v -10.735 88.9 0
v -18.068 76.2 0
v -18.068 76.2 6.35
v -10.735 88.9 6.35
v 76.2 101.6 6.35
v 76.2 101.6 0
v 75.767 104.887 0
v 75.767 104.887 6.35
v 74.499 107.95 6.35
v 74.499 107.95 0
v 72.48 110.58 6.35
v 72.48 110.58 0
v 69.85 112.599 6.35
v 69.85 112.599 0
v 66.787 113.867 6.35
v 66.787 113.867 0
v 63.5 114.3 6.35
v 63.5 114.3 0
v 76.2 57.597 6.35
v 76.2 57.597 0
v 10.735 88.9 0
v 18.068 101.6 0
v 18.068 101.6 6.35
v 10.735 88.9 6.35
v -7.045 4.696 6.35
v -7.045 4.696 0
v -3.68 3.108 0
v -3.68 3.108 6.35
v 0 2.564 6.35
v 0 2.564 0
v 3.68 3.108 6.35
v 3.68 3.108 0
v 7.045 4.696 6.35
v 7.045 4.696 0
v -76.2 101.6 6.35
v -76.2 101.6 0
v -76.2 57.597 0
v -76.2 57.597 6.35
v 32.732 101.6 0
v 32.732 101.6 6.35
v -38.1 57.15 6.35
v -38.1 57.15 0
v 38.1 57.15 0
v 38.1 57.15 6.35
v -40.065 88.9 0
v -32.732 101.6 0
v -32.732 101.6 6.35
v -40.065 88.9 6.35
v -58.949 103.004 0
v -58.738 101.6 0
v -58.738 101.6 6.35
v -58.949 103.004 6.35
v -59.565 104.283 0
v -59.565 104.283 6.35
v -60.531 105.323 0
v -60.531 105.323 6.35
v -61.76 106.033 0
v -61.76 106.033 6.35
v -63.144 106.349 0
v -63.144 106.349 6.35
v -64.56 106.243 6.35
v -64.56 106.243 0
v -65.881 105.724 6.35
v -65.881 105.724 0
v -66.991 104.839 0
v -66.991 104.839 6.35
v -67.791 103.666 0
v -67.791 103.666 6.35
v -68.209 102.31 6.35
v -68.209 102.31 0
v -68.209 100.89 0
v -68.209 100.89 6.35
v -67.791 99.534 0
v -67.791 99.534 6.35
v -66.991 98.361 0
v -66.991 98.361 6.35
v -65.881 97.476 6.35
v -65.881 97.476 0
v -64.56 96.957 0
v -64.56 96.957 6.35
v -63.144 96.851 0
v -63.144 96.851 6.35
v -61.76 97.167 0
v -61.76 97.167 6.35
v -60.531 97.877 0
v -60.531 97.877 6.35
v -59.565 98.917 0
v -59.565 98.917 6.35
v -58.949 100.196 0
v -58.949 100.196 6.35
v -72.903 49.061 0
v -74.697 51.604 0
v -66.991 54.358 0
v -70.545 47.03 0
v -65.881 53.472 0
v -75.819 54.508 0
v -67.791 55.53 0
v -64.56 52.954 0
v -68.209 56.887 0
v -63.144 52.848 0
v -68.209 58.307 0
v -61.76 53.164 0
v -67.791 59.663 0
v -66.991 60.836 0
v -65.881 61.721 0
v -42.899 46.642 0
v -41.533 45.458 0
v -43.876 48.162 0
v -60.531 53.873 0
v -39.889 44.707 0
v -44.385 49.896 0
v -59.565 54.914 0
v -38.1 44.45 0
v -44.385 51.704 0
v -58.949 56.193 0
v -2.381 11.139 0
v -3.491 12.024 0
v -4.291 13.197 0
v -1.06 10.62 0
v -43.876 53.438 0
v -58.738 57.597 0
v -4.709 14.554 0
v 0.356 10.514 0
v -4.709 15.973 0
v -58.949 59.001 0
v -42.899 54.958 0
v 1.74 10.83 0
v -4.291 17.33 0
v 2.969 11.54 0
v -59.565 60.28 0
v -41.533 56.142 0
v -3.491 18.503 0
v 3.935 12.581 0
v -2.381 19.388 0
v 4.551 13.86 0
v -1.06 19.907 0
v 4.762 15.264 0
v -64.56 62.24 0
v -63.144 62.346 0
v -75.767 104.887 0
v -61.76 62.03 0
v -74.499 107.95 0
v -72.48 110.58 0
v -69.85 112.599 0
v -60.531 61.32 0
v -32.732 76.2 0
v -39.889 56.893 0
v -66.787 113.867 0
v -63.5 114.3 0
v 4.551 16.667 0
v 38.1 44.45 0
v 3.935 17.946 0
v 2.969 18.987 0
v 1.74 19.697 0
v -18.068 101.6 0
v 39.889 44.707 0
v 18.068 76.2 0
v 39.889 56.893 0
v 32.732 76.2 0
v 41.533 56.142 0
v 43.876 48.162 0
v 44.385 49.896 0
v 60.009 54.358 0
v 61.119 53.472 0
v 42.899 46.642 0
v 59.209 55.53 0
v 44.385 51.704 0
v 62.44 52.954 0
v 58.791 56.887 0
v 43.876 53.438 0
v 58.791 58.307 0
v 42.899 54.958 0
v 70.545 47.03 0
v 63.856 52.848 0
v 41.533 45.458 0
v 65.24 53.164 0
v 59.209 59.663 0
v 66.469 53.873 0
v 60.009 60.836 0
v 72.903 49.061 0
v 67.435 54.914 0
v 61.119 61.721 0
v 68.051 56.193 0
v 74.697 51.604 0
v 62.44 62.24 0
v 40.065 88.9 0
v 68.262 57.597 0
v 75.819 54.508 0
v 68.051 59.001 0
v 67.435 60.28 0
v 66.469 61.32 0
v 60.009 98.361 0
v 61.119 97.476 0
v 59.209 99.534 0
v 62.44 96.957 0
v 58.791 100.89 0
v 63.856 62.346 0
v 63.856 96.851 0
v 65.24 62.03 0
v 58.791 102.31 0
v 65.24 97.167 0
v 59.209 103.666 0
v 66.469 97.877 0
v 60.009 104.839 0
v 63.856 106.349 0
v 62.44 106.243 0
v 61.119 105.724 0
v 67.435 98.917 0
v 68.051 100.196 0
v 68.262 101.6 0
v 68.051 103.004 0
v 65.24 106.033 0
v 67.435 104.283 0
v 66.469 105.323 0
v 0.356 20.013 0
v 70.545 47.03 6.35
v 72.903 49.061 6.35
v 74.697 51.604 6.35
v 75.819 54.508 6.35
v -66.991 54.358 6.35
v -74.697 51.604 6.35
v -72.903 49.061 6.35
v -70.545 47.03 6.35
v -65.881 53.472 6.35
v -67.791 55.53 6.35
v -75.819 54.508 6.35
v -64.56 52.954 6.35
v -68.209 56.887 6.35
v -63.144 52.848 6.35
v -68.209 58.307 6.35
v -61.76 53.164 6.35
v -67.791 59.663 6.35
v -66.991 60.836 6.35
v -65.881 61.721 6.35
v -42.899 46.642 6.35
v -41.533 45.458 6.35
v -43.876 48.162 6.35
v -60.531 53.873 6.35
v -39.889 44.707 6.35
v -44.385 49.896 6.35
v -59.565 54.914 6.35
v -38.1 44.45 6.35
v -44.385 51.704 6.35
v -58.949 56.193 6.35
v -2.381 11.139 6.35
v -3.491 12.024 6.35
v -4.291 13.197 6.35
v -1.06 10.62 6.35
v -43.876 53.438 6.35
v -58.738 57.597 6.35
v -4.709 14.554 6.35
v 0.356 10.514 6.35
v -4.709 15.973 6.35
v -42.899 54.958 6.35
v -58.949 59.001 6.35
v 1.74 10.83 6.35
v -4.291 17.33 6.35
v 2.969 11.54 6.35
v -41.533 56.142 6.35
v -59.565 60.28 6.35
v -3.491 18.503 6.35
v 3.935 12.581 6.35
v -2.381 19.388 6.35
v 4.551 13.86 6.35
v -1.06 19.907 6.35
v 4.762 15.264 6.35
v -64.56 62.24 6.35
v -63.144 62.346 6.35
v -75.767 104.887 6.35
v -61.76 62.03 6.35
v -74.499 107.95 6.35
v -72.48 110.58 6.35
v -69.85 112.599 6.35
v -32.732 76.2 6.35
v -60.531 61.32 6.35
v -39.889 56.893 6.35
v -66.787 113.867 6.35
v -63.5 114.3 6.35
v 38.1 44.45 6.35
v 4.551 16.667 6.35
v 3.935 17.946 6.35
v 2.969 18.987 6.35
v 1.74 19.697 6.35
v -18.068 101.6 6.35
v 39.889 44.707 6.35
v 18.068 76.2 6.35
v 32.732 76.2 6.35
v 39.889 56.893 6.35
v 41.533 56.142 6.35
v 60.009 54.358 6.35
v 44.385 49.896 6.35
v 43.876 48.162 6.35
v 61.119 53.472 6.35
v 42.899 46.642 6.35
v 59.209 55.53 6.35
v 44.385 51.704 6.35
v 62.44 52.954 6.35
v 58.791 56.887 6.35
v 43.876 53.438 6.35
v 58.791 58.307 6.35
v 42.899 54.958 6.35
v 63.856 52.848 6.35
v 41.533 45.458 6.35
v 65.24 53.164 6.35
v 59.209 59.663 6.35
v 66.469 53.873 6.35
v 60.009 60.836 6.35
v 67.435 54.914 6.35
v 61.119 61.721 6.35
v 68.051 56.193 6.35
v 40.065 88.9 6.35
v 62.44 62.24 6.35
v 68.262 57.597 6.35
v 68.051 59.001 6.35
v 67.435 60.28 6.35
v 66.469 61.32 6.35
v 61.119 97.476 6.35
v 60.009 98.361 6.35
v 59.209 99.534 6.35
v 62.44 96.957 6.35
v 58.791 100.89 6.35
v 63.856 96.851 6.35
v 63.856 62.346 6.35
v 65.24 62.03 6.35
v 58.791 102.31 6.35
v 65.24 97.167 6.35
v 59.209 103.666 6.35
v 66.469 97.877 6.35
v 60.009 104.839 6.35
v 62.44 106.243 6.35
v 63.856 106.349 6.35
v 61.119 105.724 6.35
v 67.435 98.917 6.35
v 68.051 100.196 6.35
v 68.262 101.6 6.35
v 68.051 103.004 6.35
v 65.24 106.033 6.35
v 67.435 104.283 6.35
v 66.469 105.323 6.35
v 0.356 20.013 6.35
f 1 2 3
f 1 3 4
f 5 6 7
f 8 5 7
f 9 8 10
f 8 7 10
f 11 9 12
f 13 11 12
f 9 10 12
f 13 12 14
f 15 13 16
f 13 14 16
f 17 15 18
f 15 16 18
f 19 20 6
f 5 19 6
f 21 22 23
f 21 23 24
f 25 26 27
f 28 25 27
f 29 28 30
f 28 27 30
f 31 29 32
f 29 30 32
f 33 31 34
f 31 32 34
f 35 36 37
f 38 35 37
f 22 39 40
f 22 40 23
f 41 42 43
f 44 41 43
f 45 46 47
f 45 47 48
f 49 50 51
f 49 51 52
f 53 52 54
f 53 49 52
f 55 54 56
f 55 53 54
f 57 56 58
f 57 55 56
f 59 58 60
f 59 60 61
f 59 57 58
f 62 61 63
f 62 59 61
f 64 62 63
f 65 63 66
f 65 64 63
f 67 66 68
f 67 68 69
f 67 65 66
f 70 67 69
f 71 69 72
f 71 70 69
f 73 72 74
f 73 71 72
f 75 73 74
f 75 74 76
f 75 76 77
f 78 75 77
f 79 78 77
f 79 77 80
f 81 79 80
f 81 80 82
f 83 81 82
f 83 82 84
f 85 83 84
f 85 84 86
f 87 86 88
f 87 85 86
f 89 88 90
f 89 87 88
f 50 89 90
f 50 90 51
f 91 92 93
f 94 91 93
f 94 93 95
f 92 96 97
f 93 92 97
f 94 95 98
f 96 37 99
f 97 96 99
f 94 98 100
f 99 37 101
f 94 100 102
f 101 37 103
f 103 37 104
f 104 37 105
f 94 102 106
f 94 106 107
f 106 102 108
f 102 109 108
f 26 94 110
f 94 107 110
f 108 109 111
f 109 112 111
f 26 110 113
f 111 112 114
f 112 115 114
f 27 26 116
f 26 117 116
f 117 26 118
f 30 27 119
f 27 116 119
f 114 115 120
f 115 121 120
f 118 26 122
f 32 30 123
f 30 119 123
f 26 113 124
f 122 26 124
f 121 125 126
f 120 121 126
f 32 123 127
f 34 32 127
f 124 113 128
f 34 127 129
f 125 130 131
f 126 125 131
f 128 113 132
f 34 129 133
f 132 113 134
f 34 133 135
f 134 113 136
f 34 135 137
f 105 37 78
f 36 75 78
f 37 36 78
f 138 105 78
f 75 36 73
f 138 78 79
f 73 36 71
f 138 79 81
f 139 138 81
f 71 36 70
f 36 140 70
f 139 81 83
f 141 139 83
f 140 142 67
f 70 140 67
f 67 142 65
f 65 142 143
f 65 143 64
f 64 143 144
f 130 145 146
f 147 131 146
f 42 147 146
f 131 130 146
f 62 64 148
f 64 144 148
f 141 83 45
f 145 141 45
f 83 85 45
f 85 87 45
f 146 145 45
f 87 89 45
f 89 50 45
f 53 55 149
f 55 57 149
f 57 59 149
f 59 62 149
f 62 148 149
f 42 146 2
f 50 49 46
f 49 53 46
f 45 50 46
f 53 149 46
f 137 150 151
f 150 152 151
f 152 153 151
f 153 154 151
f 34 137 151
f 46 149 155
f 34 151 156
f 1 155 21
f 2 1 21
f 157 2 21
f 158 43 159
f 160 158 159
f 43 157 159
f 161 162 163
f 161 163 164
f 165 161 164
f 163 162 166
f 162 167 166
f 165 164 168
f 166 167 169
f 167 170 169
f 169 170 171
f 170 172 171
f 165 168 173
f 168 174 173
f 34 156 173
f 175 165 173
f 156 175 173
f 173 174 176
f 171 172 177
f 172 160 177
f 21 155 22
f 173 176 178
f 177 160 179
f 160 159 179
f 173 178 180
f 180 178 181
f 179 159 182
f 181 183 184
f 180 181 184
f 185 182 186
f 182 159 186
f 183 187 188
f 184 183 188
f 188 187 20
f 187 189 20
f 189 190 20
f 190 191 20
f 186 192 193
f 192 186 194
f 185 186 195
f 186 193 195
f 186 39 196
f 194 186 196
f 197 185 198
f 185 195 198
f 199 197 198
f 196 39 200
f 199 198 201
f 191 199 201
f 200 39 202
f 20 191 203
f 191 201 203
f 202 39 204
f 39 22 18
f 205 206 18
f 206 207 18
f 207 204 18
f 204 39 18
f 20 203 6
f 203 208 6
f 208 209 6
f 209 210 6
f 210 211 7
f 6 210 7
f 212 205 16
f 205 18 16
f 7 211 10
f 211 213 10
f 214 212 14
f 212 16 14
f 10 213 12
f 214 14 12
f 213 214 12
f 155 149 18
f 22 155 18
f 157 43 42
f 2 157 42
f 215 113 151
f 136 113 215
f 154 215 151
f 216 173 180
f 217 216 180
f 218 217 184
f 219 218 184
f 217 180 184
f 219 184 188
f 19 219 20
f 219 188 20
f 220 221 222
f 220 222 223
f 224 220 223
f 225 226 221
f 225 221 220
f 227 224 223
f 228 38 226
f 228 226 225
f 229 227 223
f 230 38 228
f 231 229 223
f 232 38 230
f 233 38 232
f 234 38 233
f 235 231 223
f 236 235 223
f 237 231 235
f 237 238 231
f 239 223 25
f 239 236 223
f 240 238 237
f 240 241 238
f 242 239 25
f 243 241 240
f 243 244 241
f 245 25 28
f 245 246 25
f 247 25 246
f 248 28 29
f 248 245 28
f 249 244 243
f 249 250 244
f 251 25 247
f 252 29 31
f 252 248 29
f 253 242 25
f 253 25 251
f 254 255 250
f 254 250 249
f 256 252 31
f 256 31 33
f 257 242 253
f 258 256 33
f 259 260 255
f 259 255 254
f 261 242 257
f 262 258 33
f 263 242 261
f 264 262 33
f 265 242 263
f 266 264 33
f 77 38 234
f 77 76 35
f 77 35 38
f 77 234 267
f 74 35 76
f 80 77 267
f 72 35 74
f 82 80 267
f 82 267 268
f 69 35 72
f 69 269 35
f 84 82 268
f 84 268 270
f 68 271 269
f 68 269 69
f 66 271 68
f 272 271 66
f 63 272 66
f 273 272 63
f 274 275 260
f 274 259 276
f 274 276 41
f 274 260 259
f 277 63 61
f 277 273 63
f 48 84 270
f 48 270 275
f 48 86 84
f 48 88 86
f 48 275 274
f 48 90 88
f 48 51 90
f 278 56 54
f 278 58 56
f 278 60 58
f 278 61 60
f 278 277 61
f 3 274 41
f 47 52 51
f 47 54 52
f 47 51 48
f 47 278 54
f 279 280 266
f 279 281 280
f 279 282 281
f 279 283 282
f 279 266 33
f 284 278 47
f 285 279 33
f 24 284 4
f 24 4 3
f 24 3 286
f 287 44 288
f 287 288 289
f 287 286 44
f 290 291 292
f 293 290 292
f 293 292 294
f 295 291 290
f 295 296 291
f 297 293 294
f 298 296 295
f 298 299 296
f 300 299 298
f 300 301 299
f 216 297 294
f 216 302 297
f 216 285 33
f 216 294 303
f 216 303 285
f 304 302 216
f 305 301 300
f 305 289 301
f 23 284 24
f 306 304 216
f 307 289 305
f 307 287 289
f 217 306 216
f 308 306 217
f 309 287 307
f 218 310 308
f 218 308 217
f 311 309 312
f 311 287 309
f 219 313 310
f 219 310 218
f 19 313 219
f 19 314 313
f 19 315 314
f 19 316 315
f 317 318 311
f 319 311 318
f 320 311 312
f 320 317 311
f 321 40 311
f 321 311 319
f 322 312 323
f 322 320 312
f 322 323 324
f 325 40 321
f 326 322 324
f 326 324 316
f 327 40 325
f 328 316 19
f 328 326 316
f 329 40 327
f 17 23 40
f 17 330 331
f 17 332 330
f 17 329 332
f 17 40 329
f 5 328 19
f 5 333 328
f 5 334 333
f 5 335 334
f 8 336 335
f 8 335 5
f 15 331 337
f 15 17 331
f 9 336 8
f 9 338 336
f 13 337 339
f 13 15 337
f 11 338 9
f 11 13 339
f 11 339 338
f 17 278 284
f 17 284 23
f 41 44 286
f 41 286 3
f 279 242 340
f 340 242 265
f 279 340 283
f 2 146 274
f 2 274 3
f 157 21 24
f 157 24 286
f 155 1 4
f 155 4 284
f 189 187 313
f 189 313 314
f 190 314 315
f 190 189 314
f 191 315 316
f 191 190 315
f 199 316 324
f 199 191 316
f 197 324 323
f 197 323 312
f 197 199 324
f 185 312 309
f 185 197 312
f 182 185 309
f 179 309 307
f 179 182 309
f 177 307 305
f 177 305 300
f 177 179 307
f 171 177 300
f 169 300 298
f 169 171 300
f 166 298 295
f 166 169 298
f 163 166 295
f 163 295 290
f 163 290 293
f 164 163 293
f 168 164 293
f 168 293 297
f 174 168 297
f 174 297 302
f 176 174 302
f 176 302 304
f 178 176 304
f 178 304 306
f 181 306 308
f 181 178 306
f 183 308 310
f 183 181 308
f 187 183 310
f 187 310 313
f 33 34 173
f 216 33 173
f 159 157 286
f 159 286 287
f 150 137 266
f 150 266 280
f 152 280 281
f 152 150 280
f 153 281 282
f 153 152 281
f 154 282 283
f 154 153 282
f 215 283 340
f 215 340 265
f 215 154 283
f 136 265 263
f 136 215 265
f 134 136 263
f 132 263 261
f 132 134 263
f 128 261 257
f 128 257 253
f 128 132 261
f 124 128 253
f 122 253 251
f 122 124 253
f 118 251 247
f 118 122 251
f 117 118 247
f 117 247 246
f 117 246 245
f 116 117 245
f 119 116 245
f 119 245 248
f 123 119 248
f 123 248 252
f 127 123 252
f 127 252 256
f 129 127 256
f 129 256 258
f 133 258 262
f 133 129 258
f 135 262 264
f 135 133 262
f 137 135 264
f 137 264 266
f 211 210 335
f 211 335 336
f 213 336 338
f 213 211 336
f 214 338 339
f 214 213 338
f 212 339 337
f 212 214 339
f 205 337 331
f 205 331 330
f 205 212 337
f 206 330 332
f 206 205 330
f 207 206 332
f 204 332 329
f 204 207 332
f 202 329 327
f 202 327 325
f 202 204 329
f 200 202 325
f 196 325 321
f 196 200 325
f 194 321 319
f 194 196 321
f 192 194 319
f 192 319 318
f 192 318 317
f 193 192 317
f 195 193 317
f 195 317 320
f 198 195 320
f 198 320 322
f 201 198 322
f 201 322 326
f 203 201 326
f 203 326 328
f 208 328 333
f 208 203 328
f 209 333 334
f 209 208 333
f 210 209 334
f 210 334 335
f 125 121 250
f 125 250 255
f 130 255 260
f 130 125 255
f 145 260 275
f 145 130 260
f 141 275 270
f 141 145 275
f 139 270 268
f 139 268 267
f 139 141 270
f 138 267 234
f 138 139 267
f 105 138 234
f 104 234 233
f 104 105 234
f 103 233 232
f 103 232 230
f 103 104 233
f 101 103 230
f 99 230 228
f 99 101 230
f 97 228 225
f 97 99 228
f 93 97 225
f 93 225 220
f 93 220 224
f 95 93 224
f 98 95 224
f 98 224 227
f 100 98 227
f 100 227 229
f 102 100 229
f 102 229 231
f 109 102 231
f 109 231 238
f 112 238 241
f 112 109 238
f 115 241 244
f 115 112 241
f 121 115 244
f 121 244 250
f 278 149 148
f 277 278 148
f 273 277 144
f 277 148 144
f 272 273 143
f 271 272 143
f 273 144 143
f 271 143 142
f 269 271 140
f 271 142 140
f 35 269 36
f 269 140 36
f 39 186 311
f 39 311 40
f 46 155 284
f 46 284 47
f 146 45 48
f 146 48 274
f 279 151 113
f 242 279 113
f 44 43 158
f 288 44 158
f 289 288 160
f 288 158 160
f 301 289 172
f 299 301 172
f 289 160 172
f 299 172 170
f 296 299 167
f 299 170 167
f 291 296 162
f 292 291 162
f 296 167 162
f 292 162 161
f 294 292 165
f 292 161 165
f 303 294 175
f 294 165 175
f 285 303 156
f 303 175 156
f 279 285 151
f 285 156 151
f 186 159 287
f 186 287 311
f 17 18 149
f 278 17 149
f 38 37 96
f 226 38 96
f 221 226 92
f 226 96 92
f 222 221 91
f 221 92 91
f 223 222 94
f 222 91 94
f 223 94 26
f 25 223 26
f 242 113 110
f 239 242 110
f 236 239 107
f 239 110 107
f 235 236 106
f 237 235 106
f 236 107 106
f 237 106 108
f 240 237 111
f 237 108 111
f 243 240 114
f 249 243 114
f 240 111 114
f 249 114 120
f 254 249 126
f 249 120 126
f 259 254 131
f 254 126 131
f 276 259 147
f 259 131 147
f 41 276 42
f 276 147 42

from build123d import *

# Parameters (mm, degrees)
SKETCH1_R           = 4.7625
BOSS_EXTRUDE1_DEPTH = 6.35


with BuildPart() as part:
    # Sketch1 → Boss-Extrude1 (new body)
    with BuildSketch(Plane.XY):
        with BuildLine():
            Line((7.044692492, 4.696461661), (70.544692492, 47.029794995))
            ThreePointArc((70.544692492, 47.029794995), (74.697267404, 51.604238079), (76.2, 57.596833733))
            Line((76.2, 57.596833733), (76.2, 101.6))
            ThreePointArc((76.2, 101.6), (72.480256121, 110.580256121), (63.5, 114.3))
            Line((63.5, 114.3), (-63.5, 114.3))
            ThreePointArc((-63.5, 114.3), (-72.480256121, 110.580256121), (-76.2, 101.6))
            Line((-76.2, 101.6), (-76.2, 57.596833733))
            ThreePointArc((-76.2, 57.596833733), (-74.697267404, 51.604238079), (-70.544692492, 47.029794995))
            Line((-70.544692492, 47.029794995), (-7.044692492, 4.696461661))
            ThreePointArc((-7.044692492, 4.696461661), (0, 2.563500399), (7.044692492, 4.696461661))
        make_face()
        with Locations((-63.5, 101.6)):
            Circle(SKETCH1_R, mode=Mode.SUBTRACT)
        with Locations((-63.5, 57.596833733)):
            Circle(SKETCH1_R, mode=Mode.SUBTRACT)
        with Locations((63.5, 101.6)):
            Circle(SKETCH1_R, mode=Mode.SUBTRACT)
        with Locations((63.5, 57.596833733)):
            Circle(SKETCH1_R, mode=Mode.SUBTRACT)
        with Locations((0, 15.263500399)):
            Circle(SKETCH1_R, mode=Mode.SUBTRACT)
        with BuildLine():
            Line((-38.1, 57.15), (38.1, 57.15))
            ThreePointArc((38.1, 57.15), (44.45, 50.8), (38.1, 44.45))
            Line((38.1, 44.45), (-38.1, 44.45))
            ThreePointArc((-38.1, 44.45), (-44.45, 50.8), (-38.1, 57.15))
        make_face(mode=Mode.SUBTRACT)
        Polygon((-10.735303163, 88.9), (-18.067651581, 101.6), (-32.732348419, 101.6), (-40.064696837, 88.9), (-32.732348419, 76.2), (-18.067651581, 76.2), align=None, mode=Mode.SUBTRACT)
        Polygon((40.064696837, 88.9), (32.732348419, 101.6), (18.067651581, 101.6), (10.735303163, 88.9), (18.067651581, 76.2), (32.732348419, 76.2), align=None, mode=Mode.SUBTRACT)
    extrude(amount=BOSS_EXTRUDE1_DEPTH)


solid = part.part
